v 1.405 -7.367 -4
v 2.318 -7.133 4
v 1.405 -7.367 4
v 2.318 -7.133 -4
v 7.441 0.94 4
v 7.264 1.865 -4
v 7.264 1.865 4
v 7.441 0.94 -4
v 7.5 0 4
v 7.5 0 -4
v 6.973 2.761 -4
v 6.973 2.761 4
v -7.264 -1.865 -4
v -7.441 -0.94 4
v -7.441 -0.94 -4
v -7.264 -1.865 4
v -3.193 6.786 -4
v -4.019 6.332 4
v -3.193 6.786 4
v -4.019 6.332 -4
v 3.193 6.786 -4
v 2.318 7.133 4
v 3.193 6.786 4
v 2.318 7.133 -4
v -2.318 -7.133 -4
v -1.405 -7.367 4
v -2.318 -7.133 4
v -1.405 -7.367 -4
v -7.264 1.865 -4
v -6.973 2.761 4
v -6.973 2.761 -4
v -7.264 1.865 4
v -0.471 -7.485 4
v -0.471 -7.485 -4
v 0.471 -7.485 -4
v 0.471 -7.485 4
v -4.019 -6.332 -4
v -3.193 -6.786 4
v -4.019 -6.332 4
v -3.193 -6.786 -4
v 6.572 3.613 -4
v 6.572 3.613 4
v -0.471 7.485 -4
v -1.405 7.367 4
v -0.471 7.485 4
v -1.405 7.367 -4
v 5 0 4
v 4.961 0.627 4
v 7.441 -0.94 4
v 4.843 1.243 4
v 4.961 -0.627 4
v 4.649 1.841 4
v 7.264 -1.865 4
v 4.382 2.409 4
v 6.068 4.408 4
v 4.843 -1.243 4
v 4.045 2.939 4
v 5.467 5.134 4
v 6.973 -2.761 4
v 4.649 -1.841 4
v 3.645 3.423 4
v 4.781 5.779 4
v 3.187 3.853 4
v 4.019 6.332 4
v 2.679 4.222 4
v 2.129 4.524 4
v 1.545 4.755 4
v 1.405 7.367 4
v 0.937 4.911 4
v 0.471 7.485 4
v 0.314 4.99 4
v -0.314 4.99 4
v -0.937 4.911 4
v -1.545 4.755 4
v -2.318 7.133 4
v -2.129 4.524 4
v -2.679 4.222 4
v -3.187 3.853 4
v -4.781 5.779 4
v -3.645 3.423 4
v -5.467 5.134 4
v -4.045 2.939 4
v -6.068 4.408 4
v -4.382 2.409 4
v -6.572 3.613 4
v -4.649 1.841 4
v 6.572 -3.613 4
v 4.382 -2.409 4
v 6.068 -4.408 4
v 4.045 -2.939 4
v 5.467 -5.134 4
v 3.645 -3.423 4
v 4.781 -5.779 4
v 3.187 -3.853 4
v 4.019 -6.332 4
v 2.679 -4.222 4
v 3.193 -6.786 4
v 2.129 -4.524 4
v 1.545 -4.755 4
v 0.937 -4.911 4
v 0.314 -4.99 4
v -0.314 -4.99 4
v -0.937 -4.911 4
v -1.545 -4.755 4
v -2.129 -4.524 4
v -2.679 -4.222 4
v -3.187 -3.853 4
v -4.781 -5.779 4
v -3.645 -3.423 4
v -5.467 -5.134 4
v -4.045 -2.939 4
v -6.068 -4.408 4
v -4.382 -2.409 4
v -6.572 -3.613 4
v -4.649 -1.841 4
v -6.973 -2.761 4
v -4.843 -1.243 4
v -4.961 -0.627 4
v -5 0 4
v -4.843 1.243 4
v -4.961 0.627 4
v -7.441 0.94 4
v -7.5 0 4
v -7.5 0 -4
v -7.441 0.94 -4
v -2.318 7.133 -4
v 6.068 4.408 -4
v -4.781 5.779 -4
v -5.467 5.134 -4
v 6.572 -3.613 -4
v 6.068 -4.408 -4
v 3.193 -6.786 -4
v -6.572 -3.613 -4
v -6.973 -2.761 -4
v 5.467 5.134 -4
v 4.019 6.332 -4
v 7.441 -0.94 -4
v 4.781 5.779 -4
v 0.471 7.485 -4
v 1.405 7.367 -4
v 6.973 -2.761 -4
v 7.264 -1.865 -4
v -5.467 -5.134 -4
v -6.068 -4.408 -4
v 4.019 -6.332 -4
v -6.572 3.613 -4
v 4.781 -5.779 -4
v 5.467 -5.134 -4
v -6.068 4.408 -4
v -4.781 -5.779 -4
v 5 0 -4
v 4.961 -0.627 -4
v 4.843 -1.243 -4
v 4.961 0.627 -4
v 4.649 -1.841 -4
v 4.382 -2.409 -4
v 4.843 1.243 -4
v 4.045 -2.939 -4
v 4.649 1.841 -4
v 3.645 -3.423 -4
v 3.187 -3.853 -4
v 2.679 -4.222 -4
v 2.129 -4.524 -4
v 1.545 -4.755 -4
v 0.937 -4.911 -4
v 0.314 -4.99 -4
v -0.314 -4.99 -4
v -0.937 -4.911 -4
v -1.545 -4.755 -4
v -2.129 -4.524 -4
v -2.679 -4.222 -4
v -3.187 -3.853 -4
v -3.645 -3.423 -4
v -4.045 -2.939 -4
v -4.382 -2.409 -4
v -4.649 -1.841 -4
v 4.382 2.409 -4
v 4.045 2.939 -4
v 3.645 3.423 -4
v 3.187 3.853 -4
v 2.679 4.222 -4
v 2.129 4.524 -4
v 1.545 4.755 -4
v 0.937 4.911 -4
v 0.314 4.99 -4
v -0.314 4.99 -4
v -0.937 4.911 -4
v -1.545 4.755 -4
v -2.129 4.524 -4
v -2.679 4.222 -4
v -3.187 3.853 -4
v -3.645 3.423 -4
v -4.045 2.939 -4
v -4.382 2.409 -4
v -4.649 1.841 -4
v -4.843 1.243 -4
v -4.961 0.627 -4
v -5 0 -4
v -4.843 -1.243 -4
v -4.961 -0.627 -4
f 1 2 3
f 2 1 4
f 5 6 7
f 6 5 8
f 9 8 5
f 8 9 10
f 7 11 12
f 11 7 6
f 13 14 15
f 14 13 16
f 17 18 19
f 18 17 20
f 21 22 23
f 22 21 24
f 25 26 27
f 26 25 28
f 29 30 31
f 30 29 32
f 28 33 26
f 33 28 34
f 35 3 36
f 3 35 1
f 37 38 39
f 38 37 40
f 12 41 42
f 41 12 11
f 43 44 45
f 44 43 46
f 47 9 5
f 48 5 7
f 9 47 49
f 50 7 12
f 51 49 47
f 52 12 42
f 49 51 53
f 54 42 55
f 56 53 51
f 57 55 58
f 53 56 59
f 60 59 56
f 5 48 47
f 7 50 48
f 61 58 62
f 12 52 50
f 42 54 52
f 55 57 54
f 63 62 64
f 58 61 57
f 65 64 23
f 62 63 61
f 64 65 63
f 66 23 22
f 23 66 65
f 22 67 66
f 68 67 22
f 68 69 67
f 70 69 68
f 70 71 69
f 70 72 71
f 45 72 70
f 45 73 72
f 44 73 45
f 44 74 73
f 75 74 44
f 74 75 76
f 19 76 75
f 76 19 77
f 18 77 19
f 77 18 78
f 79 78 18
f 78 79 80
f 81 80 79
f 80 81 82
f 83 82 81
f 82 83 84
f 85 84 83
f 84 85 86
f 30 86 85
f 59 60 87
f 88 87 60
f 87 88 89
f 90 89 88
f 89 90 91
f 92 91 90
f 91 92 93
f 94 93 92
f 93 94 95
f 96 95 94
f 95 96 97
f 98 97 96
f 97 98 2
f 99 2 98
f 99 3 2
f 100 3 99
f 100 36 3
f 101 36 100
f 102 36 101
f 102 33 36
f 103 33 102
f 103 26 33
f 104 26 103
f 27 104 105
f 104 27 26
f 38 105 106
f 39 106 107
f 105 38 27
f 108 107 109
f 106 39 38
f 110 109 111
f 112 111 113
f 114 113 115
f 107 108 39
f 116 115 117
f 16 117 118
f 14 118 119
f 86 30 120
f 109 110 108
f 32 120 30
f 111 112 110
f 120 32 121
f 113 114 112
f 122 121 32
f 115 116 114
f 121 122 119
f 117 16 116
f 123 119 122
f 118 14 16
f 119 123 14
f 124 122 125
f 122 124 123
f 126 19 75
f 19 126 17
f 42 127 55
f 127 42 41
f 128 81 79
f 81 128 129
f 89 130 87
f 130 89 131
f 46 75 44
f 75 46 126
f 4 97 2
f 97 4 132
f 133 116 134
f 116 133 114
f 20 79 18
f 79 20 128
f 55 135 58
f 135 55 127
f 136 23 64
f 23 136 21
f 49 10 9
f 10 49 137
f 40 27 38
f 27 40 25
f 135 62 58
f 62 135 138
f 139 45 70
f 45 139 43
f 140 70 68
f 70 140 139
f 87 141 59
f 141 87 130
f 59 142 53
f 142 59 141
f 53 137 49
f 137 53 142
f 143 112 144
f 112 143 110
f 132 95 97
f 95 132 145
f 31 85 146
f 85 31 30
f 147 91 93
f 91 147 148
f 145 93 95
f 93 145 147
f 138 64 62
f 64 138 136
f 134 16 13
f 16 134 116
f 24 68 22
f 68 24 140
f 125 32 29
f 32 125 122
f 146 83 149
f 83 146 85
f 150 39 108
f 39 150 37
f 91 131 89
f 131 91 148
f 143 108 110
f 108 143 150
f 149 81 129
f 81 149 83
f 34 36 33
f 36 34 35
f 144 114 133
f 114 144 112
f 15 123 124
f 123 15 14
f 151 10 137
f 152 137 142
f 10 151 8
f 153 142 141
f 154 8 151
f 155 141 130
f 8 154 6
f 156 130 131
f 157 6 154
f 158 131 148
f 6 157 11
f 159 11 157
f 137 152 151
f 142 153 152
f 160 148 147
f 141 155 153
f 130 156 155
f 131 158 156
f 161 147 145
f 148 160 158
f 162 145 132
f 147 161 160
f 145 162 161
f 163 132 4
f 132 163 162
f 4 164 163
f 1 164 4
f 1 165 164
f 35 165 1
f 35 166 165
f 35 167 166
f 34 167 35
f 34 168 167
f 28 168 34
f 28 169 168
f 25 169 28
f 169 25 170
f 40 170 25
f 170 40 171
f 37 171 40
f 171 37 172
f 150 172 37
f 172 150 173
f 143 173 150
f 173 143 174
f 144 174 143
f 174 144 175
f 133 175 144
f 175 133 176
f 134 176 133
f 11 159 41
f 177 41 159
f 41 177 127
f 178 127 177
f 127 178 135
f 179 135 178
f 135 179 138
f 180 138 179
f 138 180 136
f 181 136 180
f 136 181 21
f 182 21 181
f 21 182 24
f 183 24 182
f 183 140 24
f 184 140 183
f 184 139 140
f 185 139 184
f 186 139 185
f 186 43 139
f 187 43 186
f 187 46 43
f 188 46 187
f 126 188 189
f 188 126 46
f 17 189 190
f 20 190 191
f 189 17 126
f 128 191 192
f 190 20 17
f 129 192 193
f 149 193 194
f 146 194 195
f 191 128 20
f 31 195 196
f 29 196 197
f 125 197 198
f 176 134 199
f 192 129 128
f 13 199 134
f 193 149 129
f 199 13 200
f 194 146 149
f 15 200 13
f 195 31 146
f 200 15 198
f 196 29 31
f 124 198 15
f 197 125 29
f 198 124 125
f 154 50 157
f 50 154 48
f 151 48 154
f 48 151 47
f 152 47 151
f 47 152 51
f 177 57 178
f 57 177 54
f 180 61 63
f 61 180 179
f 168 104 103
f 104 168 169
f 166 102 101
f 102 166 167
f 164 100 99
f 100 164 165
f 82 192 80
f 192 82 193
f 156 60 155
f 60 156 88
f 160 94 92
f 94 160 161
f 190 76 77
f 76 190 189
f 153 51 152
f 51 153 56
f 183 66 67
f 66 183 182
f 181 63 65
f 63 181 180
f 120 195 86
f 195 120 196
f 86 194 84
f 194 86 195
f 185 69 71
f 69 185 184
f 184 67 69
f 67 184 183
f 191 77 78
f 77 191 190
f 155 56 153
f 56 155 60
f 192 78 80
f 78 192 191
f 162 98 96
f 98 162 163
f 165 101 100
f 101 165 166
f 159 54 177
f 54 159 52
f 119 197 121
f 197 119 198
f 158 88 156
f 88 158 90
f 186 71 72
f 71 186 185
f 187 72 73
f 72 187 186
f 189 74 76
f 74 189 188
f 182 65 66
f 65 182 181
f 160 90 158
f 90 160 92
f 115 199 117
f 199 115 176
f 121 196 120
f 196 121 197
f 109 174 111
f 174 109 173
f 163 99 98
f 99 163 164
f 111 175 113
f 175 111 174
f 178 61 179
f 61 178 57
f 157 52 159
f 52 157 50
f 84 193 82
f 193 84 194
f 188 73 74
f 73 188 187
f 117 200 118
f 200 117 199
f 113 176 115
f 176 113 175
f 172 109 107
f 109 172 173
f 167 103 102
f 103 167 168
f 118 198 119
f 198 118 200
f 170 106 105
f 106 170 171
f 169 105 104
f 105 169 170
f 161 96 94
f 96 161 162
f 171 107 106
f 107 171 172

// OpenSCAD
$fn = 50;


difference() {
	union() {
		translate(v = [0, 0, -4.0000000000]) {
			cylinder(h = 8, r = 7.5000000000);
		}
	}
	union() {
		translate(v = [0, 0, -100.0000000000]) {
			cylinder(h = 200, r = 5.0000000000);
		}
	}
}
